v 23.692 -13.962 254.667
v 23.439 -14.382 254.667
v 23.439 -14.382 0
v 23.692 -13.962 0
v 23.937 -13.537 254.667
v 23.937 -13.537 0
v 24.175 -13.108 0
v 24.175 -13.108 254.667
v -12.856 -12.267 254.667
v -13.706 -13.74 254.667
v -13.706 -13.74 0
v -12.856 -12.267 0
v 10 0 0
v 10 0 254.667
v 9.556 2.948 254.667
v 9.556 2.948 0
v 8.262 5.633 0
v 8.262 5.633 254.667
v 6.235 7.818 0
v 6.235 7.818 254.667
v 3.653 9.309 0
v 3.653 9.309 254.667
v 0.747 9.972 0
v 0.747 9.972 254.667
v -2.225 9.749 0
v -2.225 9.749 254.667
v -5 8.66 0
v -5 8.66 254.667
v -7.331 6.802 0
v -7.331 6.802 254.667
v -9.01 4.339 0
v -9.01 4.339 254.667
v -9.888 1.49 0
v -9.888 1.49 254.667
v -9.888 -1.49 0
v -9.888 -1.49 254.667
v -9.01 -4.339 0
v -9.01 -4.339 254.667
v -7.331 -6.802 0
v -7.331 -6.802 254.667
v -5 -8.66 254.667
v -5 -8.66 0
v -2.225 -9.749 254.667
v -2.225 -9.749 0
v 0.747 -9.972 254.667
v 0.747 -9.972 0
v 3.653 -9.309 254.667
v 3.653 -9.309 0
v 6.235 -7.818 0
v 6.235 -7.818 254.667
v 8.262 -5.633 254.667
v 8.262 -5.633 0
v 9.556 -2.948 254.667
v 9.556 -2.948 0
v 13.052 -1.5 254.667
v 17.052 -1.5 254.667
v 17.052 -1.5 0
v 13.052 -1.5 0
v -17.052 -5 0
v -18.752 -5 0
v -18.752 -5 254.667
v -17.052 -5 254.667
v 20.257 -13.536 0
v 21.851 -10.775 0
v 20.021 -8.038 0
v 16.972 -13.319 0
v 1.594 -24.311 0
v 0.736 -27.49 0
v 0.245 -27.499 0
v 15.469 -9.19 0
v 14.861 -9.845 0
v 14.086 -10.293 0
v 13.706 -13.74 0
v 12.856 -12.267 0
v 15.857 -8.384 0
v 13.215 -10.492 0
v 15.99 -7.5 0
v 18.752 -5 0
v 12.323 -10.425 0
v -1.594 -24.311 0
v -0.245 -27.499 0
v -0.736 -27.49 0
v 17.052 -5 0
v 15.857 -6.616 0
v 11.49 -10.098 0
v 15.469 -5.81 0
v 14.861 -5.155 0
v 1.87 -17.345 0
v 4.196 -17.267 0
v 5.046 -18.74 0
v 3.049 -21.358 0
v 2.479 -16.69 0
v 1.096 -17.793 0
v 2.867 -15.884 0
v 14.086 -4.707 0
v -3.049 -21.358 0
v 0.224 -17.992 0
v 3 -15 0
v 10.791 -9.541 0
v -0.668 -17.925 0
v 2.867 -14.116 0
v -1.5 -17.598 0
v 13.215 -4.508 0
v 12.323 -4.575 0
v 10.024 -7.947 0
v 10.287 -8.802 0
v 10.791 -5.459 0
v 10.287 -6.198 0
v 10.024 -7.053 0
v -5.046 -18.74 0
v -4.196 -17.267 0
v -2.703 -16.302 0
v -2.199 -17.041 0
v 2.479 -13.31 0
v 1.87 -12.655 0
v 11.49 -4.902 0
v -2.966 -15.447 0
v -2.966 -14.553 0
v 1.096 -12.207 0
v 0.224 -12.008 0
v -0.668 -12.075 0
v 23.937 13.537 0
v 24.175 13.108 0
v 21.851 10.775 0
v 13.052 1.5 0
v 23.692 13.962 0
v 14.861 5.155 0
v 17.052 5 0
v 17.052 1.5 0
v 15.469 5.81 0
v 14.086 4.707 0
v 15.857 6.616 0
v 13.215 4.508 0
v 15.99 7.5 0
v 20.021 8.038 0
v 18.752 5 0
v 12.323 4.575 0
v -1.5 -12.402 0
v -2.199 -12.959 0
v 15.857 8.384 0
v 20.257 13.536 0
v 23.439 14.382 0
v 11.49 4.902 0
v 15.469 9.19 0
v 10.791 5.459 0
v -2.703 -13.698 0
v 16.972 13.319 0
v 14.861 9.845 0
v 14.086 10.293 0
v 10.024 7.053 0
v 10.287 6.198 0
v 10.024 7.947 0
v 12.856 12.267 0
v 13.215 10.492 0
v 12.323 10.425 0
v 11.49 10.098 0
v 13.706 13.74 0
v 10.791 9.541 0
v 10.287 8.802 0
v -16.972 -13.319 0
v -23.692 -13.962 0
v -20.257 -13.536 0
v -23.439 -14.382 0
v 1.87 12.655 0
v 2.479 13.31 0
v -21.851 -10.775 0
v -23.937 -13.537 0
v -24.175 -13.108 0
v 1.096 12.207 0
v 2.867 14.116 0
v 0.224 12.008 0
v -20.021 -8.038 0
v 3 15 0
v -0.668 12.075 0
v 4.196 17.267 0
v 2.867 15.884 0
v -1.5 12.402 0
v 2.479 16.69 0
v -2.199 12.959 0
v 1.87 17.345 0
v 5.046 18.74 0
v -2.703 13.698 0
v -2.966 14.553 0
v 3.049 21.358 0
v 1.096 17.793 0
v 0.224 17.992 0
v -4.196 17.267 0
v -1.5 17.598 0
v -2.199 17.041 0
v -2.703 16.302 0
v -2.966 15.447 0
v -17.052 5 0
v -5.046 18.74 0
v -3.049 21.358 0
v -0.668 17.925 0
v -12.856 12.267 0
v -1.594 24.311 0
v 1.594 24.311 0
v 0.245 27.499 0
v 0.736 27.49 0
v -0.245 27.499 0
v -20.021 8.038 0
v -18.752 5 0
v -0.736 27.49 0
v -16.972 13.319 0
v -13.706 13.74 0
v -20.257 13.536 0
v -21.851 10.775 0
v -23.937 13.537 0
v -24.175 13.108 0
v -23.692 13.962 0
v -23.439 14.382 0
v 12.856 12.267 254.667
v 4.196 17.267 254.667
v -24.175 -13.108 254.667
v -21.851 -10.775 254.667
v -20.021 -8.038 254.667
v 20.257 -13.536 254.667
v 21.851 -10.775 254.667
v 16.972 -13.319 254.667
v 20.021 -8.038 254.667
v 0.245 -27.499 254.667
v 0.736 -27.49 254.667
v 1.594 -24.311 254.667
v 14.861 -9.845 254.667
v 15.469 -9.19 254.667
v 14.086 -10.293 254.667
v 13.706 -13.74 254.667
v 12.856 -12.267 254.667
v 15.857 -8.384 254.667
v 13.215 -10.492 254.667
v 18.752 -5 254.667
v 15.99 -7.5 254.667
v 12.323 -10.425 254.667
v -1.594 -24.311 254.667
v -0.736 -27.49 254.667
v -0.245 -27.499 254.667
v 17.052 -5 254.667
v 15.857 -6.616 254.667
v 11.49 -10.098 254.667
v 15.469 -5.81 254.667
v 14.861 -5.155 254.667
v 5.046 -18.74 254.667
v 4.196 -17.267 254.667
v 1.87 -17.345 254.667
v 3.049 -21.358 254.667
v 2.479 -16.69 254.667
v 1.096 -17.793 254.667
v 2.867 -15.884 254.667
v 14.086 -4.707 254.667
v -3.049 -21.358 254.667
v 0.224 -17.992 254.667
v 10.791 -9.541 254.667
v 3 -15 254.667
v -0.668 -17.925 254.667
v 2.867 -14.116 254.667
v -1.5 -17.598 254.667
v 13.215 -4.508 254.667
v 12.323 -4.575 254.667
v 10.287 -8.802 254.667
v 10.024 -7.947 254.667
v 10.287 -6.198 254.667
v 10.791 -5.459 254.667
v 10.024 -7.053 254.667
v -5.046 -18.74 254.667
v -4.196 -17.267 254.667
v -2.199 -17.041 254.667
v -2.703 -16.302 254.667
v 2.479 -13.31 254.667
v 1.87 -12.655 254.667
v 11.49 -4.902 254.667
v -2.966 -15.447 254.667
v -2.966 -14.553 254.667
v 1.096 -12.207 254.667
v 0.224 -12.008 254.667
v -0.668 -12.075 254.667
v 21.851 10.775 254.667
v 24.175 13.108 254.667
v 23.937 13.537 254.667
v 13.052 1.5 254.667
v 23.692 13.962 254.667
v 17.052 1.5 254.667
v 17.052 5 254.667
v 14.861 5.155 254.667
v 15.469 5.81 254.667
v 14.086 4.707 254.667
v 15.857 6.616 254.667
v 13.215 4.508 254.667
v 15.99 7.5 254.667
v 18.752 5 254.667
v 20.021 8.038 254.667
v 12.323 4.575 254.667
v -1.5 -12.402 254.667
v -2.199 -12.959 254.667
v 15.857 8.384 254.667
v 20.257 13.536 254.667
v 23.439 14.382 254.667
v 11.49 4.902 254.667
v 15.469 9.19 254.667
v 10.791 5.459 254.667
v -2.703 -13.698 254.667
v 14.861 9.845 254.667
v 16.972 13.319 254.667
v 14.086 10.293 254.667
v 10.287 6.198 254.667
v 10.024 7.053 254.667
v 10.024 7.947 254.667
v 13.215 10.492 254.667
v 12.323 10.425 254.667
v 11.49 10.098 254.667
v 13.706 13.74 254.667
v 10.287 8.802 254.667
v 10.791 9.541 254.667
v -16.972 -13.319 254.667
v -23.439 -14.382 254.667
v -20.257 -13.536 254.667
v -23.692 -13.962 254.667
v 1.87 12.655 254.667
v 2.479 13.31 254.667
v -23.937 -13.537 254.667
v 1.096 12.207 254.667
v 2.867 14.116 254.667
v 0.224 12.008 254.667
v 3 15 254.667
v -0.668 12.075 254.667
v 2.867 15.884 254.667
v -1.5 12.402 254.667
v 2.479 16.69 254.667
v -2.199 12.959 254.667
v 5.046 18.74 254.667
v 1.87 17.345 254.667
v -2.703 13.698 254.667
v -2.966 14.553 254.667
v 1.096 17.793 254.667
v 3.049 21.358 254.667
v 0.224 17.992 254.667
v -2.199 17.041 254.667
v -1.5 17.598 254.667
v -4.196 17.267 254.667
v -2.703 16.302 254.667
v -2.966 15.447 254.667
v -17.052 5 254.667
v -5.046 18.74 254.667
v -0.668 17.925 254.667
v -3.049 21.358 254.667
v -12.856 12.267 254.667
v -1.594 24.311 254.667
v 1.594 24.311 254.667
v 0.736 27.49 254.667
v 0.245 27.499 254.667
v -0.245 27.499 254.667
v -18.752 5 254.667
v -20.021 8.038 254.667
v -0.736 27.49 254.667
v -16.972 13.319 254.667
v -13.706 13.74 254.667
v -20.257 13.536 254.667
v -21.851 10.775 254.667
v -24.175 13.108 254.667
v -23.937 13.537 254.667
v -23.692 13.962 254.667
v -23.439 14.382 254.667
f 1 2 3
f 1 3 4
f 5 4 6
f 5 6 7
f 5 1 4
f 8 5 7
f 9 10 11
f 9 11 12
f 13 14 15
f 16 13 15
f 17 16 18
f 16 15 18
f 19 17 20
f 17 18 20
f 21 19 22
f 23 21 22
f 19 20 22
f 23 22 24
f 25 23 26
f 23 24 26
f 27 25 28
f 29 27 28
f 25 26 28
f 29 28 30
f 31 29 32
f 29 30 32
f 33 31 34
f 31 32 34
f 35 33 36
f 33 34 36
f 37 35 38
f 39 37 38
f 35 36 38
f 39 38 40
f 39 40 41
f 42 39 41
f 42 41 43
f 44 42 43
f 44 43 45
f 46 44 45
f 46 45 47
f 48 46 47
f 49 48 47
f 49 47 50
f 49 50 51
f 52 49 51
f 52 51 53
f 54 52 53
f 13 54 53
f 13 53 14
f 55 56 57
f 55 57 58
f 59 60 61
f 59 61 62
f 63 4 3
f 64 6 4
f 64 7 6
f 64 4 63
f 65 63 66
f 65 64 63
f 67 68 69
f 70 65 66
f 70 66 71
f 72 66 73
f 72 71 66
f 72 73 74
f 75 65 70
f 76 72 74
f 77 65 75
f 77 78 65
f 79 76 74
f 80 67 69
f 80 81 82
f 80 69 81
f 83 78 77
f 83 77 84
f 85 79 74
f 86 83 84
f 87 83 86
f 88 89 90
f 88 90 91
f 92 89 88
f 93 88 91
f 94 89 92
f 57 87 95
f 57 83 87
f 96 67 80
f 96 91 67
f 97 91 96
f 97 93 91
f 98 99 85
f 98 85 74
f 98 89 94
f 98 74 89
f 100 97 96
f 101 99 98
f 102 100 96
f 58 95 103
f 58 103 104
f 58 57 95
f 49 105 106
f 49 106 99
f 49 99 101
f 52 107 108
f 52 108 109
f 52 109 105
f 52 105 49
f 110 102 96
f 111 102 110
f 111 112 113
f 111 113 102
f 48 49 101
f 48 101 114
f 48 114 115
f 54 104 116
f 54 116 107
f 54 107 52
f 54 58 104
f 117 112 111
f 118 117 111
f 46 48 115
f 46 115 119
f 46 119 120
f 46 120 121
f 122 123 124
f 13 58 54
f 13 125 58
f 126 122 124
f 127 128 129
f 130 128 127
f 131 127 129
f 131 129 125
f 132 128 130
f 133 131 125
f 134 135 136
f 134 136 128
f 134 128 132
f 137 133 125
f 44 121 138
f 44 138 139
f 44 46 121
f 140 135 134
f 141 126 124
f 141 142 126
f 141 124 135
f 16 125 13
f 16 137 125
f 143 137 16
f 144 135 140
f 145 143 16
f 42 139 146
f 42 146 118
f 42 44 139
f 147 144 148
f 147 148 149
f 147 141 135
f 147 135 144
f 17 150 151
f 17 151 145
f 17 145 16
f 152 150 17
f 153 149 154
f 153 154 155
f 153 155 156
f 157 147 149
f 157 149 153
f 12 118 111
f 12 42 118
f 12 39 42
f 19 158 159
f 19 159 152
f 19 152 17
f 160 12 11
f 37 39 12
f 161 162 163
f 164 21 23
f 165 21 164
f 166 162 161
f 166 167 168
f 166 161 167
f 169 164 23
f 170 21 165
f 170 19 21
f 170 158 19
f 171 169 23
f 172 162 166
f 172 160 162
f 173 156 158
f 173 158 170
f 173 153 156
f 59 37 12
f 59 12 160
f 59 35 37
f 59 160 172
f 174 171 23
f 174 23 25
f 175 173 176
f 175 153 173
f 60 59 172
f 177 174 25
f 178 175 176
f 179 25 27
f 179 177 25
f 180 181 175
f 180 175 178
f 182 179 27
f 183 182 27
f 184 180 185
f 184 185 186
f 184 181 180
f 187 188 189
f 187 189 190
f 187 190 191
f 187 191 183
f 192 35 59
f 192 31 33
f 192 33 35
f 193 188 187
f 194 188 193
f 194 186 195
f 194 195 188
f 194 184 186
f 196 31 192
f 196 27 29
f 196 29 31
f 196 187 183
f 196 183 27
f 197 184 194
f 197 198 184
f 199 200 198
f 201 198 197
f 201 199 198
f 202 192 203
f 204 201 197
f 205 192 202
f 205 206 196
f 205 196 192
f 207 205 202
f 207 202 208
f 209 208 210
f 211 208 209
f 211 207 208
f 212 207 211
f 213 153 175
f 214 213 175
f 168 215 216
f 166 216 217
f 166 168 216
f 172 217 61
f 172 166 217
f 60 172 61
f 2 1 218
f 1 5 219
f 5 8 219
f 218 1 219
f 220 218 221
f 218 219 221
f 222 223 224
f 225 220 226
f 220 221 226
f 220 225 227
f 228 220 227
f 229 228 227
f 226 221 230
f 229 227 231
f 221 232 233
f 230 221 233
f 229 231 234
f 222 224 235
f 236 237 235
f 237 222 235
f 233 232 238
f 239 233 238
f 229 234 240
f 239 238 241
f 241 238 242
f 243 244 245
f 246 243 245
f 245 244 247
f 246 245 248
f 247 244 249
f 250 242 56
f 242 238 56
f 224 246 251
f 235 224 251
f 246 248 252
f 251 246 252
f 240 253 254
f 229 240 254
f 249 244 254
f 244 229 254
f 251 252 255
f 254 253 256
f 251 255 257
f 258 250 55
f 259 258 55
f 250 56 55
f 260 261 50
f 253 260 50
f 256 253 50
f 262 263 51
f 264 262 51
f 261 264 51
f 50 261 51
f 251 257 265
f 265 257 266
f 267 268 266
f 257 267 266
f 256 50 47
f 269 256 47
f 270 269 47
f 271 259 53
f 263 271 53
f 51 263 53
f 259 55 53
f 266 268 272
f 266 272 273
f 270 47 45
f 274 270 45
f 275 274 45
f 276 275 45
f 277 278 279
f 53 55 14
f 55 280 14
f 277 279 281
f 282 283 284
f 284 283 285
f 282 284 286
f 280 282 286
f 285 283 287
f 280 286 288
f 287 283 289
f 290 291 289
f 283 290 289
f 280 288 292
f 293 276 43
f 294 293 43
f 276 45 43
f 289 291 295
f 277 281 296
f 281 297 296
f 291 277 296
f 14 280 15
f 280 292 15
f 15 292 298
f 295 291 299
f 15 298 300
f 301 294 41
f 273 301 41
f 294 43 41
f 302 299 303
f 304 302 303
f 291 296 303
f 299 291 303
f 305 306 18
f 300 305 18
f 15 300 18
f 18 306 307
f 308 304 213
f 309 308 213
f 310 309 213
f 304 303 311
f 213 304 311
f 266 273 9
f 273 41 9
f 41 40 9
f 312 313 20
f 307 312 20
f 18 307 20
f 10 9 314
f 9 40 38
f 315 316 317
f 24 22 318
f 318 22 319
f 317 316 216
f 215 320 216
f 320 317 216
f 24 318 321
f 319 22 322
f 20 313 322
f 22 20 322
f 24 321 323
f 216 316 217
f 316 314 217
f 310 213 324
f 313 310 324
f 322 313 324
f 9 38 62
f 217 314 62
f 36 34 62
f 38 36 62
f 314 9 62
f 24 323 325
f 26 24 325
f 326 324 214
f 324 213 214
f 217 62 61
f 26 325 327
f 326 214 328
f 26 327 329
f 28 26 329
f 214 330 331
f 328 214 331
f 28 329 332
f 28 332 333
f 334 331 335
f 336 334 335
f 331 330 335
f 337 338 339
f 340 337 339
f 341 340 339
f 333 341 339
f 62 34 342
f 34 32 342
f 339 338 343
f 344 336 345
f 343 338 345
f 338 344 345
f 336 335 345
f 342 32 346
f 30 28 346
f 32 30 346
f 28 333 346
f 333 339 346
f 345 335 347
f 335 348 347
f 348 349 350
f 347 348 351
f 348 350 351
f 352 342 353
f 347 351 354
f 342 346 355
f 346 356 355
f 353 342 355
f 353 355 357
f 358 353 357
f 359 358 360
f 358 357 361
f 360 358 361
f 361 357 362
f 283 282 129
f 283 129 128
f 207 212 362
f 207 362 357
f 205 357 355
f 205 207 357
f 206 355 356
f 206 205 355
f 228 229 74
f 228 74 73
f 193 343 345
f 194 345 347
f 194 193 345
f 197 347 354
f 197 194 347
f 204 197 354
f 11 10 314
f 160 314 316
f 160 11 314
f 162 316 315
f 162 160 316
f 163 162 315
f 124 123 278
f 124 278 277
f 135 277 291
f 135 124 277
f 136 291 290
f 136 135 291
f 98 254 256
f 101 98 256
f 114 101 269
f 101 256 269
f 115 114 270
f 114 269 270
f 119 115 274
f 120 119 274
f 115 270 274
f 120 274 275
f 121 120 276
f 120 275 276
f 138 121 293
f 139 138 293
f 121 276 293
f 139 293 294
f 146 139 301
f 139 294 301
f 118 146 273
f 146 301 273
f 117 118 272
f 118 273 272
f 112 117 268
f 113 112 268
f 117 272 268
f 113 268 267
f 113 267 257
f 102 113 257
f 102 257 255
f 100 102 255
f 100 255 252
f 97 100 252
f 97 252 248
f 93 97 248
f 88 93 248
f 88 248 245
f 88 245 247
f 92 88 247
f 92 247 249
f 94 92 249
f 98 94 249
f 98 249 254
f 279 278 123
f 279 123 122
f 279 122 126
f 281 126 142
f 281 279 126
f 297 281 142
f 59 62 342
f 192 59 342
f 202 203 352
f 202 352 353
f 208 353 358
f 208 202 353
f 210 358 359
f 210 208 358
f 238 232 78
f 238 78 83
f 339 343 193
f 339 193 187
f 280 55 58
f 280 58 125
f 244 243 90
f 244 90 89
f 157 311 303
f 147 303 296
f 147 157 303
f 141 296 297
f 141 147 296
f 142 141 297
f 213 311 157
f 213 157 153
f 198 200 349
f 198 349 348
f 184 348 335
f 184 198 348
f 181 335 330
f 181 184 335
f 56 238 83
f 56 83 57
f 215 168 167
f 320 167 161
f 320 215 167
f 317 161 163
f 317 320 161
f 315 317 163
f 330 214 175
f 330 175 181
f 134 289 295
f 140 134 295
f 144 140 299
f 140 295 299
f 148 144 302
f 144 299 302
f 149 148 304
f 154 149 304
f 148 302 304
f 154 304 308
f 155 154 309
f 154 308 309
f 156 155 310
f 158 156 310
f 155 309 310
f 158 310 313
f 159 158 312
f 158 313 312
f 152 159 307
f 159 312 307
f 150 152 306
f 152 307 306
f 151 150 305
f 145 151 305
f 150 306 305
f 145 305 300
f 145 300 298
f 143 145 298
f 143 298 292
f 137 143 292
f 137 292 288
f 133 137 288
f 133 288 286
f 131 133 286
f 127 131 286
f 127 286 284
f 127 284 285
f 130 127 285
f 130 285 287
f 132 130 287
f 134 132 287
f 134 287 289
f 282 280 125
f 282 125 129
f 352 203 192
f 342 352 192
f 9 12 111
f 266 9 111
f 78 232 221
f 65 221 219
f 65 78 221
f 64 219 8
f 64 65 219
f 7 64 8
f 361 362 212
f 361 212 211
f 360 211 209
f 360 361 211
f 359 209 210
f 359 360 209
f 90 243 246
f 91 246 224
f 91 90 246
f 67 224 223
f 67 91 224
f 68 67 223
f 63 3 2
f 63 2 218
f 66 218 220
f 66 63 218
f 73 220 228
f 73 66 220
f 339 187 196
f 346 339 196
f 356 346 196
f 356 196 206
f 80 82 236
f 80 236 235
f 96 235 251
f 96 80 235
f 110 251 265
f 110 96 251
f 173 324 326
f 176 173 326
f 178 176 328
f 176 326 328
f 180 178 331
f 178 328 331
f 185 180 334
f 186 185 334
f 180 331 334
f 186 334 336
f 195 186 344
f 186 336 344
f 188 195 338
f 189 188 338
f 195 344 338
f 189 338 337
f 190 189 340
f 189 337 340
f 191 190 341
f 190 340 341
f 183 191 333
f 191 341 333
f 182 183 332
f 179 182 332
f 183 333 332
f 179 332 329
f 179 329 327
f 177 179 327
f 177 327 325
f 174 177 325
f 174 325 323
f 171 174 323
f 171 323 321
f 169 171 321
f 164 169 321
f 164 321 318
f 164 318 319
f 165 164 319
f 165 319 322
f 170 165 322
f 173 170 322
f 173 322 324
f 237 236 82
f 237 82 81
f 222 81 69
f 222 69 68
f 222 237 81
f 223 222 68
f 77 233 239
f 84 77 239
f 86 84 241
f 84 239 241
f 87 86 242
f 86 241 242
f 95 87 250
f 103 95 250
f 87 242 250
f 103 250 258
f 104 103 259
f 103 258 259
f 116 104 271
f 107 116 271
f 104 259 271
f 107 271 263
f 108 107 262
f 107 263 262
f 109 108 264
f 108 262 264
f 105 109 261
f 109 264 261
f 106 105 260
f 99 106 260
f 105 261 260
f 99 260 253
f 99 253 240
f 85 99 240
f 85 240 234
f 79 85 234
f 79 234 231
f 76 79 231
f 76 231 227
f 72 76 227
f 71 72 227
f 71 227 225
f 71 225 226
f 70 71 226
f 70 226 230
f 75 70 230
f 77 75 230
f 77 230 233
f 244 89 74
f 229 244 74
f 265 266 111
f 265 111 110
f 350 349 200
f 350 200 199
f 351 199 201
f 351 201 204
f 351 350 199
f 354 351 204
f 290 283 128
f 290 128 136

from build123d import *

# Parameters (mm, degrees)
BOSS_EXTRU_1_DEPTH      = 254.666666667
ESQUISSE4_R             = 51.382798763
ESQUISSE4_R_2           = 27.5
ENL_V_MAT_EXTRU_1_DEPTH = 265.098930571
ESQUISSE5_R             = 10
ESQUISSE5_R_2           = 3
ESQUISSE5_W             = 1.7
ESQUISSE5_H             = 10
ENL_V_MAT_EXTRU_2_DEPTH = 258.285428534


with BuildPart() as part:
    # Esquisse1 → Boss.-Extru.1 (new body)
    with BuildSketch(Plane.XY):
        with BuildLine():
            Line((-17.5, -48.310889132), (-17.5, -47.310889132))
            ThreePointArc((-17.5, -47.310889132), (-9, -15.588457268), (-32.222431864, -38.810889132))
            Line((-32.222431864, -38.810889132), (-33.088457268, -39.310889132))
            ThreePointArc((-33.088457268, -39.310889132), (-35.314540075, -27.733649929), (-29.89862988, -17.26198201))
            ThreePointArc((-29.89862988, -17.26198201), (-41.675315415, -16.716463864), (-50.588457268, -9))
            Line((-50.588457268, -9), (-49.722431864, -8.5))
            ThreePointArc((-49.722431864, -8.5), (-18, 0), (-49.722431864, 8.5))
            Line((-49.722431864, 8.5), (-50.588457268, 9))
            ThreePointArc((-50.588457268, 9), (-41.675315415, 16.716463864), (-29.89862988, 17.26198201))
            ThreePointArc((-29.89862988, 17.26198201), (-35.314540075, 27.733649929), (-33.088457268, 39.310889132))
            Line((-33.088457268, 39.310889132), (-32.222431864, 38.810889132))
            ThreePointArc((-32.222431864, 38.810889132), (-9, 15.588457268), (-17.5, 47.310889132))
            Line((-17.5, 47.310889132), (-17.5, 48.310889132))
            ThreePointArc((-17.5, 48.310889132), (-6.36077534, 44.450113792), (0, 34.523964019))
            ThreePointArc((0, 34.523964019), (6.36077534, 44.450113792), (17.5, 48.310889132))
            Line((17.5, 48.310889132), (17.5, 47.310889132))
            ThreePointArc((17.5, 47.310889132), (9, 15.588457268), (32.222431864, 38.810889132))
            Line((32.222431864, 38.810889132), (33.088457268, 39.310889132))
            ThreePointArc((33.088457268, 39.310889132), (35.314540075, 27.733649929), (29.89862988, 17.26198201))
            ThreePointArc((29.89862988, 17.26198201), (41.675315415, 16.716463864), (50.588457268, 9))
            Line((50.588457268, 9), (49.722431864, 8.5))
            ThreePointArc((49.722431864, 8.5), (18, 0), (49.722431864, -8.5))
            Line((49.722431864, -8.5), (50.588457268, -9))
            ThreePointArc((50.588457268, -9), (41.675315415, -16.716463864), (29.89862988, -17.26198201))
            ThreePointArc((29.89862988, -17.26198201), (35.314540075, -27.733649929), (33.088457268, -39.310889132))
            Line((33.088457268, -39.310889132), (32.222431864, -38.810889132))
            ThreePointArc((32.222431864, -38.810889132), (9, -15.588457268), (17.5, -47.310889132))
            Line((17.5, -47.310889132), (17.5, -48.310889132))
            ThreePointArc((17.5, -48.310889132), (6.36077534, -44.450113792), (0, -34.523964019))
            ThreePointArc((0, -34.523964019), (-6.36077534, -44.450113792), (-17.5, -48.310889132))
        make_face()
    extrude(amount=BOSS_EXTRU_1_DEPTH)

    # Esquisse4 → Enlèv. mat.-Extru.1 (cut, through all)
    with BuildSketch(Plane.XY.offset(254.666666667)):
        Circle(ESQUISSE4_R)
        Circle(ESQUISSE4_R_2, mode=Mode.SUBTRACT)
    extrude(amount=-ENL_V_MAT_EXTRU_1_DEPTH, mode=Mode.SUBTRACT)

    # Esquisse5 → Enlèv. mat.-Extru.2 (cut, through all)
    with BuildSketch(Plane.XY.offset(254.666666667)):
        Circle(ESQUISSE5_R)
        with Locations((0, 15)):
            Circle(ESQUISSE5_R_2)
        with Locations((12.990381057, 7.5)):
            Circle(ESQUISSE5_R_2)
        with Locations((12.990381057, -7.5)):
            Circle(ESQUISSE5_R_2)
        with Locations((0, -15)):
            Circle(ESQUISSE5_R_2)
        Polygon((13.706088614, -13.739641853), (5.045834576, -18.739641853), (4.195834576, -17.267398667), (12.856088614, -12.267398667), align=None)
        Polygon((17.051923191, 5), (18.751923191, 5), (18.751923191, -5), (17.051923191, -5), (17.051923191, -1.5), (13.051923191, -1.5), (13.051923191, 1.5), (17.051923191, 1.5), align=None)
        Polygon((-5.045834576, -18.739641853), (-13.706088614, -13.739641853), (-12.856088614, -12.267398667), (-4.195834576, -17.267398667), align=None)
        with Locations((-17.901923191, 0)):
            Rectangle(ESQUISSE5_W, ESQUISSE5_H)
        Polygon((-13.706088614, 13.739641853), (-5.045834576, 18.739641853), (-4.195834576, 17.267398667), (-12.856088614, 12.267398667), align=None)
        Polygon((5.045834576, 18.739641853), (13.706088614, 13.739641853), (12.856088614, 12.267398667), (4.195834576, 17.267398667), align=None)
    extrude(amount=-ENL_V_MAT_EXTRU_2_DEPTH, mode=Mode.SUBTRACT)


solid = part.part
